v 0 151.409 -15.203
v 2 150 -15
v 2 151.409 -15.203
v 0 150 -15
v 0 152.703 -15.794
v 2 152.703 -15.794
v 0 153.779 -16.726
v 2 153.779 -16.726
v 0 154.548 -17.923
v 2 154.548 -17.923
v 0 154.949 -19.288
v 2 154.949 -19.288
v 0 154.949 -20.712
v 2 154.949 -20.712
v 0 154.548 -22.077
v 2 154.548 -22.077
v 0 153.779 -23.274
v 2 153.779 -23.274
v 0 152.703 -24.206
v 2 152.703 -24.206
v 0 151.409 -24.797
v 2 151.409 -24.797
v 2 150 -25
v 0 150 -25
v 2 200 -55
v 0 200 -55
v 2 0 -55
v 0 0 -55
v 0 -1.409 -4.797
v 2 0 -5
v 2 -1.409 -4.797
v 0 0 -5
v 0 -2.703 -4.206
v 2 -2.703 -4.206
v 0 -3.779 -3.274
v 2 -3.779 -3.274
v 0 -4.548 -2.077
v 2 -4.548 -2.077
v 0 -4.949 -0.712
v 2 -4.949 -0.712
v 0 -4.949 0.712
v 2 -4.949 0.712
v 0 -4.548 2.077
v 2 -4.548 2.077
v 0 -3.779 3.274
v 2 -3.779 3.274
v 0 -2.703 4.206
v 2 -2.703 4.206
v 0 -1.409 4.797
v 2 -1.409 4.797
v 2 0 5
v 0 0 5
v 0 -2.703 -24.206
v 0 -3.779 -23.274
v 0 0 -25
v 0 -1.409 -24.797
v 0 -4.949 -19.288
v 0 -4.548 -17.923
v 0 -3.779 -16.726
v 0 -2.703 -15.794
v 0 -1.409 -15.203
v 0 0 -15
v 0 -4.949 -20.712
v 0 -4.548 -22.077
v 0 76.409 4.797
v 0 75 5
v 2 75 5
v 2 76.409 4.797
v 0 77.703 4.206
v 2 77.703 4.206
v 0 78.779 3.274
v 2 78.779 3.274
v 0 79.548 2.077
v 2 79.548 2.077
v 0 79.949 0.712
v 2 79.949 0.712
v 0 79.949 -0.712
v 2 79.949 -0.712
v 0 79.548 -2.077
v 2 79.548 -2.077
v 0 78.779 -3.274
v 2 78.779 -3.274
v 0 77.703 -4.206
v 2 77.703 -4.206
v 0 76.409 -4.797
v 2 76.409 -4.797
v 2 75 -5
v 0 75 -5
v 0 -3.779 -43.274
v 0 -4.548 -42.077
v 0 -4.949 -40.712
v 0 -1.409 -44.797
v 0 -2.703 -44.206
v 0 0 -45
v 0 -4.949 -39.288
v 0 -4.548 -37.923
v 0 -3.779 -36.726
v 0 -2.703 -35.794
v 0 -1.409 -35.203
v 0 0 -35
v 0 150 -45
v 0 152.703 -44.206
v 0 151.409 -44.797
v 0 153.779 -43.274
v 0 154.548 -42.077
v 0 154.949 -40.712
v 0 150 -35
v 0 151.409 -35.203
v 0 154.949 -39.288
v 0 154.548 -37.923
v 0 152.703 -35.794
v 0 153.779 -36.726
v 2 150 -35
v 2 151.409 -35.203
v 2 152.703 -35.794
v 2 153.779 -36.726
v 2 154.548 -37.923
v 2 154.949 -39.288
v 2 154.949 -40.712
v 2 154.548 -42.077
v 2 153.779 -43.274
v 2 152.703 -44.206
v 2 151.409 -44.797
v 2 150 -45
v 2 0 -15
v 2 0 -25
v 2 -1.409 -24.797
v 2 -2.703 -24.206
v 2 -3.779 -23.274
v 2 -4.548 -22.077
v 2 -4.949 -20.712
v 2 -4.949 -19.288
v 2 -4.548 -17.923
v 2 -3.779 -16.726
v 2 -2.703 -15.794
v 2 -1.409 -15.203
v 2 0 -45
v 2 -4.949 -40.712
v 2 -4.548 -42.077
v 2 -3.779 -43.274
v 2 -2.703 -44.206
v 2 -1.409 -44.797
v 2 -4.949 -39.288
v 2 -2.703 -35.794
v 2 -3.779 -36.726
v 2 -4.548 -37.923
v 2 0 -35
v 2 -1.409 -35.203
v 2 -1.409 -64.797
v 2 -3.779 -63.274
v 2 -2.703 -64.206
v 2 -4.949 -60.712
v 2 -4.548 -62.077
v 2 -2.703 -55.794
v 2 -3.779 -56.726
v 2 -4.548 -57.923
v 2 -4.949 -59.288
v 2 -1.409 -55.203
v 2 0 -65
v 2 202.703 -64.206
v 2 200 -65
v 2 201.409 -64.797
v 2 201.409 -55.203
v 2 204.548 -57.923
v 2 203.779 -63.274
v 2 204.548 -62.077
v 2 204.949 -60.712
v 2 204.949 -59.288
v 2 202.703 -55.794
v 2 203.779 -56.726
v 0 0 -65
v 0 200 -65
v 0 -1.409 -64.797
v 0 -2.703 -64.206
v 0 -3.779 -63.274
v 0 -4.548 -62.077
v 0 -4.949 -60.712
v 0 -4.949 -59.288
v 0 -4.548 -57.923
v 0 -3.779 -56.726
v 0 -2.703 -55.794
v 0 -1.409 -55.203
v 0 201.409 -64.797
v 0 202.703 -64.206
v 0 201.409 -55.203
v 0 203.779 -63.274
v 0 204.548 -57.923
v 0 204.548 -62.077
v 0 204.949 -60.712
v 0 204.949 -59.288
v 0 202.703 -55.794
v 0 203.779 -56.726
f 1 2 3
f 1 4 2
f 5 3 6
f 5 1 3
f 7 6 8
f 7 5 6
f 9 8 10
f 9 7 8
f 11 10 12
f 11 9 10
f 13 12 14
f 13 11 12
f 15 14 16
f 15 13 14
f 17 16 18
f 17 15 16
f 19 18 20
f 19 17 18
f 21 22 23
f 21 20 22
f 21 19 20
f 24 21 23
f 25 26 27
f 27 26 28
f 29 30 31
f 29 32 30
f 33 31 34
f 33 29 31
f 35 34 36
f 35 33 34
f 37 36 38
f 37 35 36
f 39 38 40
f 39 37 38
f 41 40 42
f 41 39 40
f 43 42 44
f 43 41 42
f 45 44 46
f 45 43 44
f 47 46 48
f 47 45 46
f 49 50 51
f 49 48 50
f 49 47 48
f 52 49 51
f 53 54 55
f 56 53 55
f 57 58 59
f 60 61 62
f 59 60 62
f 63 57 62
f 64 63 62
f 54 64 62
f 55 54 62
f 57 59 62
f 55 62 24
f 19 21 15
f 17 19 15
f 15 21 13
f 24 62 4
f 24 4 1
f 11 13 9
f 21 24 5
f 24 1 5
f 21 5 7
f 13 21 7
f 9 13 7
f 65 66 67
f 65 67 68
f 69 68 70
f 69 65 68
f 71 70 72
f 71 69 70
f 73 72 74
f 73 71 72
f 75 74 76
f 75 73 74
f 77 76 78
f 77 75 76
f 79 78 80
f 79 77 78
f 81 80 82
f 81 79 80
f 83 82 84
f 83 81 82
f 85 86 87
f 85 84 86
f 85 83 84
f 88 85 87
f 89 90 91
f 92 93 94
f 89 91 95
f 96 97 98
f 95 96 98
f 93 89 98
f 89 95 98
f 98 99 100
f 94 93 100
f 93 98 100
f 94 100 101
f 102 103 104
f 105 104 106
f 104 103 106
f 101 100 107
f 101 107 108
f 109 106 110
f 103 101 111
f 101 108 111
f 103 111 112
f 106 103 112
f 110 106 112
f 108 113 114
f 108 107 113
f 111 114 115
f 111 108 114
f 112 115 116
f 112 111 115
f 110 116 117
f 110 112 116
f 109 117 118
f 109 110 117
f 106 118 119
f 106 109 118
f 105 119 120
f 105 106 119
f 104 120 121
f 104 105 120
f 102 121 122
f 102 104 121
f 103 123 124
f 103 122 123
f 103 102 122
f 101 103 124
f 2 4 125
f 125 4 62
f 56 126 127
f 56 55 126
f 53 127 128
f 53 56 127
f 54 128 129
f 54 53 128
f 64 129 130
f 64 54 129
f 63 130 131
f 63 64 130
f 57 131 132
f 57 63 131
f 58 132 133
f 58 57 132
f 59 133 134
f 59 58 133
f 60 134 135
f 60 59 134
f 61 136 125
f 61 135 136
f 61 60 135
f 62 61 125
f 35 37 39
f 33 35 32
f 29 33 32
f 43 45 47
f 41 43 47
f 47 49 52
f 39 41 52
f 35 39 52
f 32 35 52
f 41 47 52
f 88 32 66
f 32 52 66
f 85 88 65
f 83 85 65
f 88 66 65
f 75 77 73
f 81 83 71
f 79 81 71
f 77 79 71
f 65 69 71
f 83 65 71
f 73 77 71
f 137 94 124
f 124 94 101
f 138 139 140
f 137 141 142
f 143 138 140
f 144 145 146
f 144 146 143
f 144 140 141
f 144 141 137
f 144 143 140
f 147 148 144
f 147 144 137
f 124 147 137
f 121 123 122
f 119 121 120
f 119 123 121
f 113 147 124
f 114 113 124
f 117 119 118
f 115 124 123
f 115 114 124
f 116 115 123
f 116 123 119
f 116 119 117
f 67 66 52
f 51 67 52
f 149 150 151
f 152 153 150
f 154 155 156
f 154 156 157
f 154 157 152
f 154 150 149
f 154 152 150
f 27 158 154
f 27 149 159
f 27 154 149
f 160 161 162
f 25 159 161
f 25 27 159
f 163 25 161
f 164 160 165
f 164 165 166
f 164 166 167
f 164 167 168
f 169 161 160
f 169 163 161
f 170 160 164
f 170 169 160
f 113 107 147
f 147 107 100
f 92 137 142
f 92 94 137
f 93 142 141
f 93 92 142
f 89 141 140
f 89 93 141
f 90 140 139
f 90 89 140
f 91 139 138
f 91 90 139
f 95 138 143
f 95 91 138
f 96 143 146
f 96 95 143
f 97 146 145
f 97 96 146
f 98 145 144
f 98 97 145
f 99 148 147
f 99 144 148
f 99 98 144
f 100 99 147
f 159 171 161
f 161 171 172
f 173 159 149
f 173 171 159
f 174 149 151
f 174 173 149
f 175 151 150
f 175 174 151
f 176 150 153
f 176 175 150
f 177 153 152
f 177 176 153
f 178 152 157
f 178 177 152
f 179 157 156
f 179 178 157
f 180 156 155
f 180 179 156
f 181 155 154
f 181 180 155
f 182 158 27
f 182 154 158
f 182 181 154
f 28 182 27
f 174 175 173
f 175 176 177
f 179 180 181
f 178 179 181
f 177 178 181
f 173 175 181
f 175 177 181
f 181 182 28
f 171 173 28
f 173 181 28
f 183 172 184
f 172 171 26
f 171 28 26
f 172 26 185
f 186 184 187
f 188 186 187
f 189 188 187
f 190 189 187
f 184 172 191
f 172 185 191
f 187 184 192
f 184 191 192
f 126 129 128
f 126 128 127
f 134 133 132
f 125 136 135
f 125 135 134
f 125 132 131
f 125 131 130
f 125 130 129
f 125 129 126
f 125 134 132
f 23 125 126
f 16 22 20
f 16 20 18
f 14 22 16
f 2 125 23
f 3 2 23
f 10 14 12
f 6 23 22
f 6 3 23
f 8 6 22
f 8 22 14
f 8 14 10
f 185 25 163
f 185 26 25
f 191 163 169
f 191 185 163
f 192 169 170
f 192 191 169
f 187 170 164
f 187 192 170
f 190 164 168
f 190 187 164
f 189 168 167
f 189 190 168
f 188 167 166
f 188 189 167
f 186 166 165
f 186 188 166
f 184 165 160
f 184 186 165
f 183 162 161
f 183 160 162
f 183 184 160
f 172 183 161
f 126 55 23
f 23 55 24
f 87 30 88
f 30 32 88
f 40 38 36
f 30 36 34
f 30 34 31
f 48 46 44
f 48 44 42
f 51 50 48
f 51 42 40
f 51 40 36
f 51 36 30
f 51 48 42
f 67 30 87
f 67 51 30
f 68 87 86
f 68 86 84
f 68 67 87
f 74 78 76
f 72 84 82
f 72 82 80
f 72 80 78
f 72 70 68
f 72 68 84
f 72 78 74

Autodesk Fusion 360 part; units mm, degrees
sketch "Sketch1" plane through (0, 0, 0) normal (1, 0, 0) x (0, 1, 0)
  line L0 (0, -5) -> (75, -5)
  arc A0 (75, -5) -> (75, 5) centre (75, 0) ccw
  line L1 (75, 5) -> (0, 5)
  arc A1 (0, 5) -> (0, -5) centre (0, 0) ccw
  line L2 (0, 0) -> (75, 0) construction
  line L3 (0, -25) -> (150, -25)
  arc A2 (150, -25) -> (150, -15) centre (150, -20) ccw
  line L4 (150, -15) -> (0, -15)
  arc A3 (0, -15) -> (0, -25) centre (0, -20) ccw
  line L5 (0, -20) -> (150, -20) construction
  line L6 (0, -45) -> (150, -45)
  arc A4 (150, -45) -> (150, -35) centre (150, -40) ccw
  line L7 (150, -35) -> (0, -35)
  arc A5 (0, -35) -> (0, -45) centre (0, -40) ccw
  line L8 (0, -40) -> (150, -40) construction
  line L9 (0, -65) -> (200, -65)
  arc A6 (200, -65) -> (200, -55) centre (200, -60) ccw
  line L10 (200, -55) -> (0, -55)
  arc A7 (0, -55) -> (0, -65) centre (0, -60) ccw
  line L11 (0, -60) -> (200, -60) construction
extrude "Extrude1" add sketch "Sketch1" along normal blind 2 makes body 1 at (0, 50, -21.6667) makes body 2 at (0, 50, -41.6667) makes body 3 at (0, 50, -1.6667) makes body 4 at (0, 133.3333, -61.6667) in component "Component"
copy_body "Body->Comp1" bodies 1 removing the originals makes body 5 in component "Component'"
copy_body "Body->Comp2" bodies 2 removing the originals makes body 6 in component "Component''"
copy_body "Body->Comp3" bodies 3 removing the originals makes body 7 in component "Component'''"
copy_body "Body->Comp4" bodies 4 removing the originals makes body 8 in component "Component''''"
component "Component" placed x (1, 0, 0) y (0, 1, 0) z (0, 0, 1) at (0, 0, 0)
component "Component''" placed x (1, 0, 0) y (0, 1, 0) z (0, 0, 1) at (0, 0, 0) in component "Component"
component "Component'''" placed x (1, 0, 0) y (0, 1, 0) z (0, 0, 1) at (0, 0, 0) in component "Component"
component "Component''''" placed x (1, 0, 0) y (0, 1, 0) z (0, 0, 1) at (0, 0, 0) in component "Component"
component "Component'" placed x (1, 0, 0) y (0, 1, 0) z (0, 0, 1) at (0, 0, 0) in component "Component"
